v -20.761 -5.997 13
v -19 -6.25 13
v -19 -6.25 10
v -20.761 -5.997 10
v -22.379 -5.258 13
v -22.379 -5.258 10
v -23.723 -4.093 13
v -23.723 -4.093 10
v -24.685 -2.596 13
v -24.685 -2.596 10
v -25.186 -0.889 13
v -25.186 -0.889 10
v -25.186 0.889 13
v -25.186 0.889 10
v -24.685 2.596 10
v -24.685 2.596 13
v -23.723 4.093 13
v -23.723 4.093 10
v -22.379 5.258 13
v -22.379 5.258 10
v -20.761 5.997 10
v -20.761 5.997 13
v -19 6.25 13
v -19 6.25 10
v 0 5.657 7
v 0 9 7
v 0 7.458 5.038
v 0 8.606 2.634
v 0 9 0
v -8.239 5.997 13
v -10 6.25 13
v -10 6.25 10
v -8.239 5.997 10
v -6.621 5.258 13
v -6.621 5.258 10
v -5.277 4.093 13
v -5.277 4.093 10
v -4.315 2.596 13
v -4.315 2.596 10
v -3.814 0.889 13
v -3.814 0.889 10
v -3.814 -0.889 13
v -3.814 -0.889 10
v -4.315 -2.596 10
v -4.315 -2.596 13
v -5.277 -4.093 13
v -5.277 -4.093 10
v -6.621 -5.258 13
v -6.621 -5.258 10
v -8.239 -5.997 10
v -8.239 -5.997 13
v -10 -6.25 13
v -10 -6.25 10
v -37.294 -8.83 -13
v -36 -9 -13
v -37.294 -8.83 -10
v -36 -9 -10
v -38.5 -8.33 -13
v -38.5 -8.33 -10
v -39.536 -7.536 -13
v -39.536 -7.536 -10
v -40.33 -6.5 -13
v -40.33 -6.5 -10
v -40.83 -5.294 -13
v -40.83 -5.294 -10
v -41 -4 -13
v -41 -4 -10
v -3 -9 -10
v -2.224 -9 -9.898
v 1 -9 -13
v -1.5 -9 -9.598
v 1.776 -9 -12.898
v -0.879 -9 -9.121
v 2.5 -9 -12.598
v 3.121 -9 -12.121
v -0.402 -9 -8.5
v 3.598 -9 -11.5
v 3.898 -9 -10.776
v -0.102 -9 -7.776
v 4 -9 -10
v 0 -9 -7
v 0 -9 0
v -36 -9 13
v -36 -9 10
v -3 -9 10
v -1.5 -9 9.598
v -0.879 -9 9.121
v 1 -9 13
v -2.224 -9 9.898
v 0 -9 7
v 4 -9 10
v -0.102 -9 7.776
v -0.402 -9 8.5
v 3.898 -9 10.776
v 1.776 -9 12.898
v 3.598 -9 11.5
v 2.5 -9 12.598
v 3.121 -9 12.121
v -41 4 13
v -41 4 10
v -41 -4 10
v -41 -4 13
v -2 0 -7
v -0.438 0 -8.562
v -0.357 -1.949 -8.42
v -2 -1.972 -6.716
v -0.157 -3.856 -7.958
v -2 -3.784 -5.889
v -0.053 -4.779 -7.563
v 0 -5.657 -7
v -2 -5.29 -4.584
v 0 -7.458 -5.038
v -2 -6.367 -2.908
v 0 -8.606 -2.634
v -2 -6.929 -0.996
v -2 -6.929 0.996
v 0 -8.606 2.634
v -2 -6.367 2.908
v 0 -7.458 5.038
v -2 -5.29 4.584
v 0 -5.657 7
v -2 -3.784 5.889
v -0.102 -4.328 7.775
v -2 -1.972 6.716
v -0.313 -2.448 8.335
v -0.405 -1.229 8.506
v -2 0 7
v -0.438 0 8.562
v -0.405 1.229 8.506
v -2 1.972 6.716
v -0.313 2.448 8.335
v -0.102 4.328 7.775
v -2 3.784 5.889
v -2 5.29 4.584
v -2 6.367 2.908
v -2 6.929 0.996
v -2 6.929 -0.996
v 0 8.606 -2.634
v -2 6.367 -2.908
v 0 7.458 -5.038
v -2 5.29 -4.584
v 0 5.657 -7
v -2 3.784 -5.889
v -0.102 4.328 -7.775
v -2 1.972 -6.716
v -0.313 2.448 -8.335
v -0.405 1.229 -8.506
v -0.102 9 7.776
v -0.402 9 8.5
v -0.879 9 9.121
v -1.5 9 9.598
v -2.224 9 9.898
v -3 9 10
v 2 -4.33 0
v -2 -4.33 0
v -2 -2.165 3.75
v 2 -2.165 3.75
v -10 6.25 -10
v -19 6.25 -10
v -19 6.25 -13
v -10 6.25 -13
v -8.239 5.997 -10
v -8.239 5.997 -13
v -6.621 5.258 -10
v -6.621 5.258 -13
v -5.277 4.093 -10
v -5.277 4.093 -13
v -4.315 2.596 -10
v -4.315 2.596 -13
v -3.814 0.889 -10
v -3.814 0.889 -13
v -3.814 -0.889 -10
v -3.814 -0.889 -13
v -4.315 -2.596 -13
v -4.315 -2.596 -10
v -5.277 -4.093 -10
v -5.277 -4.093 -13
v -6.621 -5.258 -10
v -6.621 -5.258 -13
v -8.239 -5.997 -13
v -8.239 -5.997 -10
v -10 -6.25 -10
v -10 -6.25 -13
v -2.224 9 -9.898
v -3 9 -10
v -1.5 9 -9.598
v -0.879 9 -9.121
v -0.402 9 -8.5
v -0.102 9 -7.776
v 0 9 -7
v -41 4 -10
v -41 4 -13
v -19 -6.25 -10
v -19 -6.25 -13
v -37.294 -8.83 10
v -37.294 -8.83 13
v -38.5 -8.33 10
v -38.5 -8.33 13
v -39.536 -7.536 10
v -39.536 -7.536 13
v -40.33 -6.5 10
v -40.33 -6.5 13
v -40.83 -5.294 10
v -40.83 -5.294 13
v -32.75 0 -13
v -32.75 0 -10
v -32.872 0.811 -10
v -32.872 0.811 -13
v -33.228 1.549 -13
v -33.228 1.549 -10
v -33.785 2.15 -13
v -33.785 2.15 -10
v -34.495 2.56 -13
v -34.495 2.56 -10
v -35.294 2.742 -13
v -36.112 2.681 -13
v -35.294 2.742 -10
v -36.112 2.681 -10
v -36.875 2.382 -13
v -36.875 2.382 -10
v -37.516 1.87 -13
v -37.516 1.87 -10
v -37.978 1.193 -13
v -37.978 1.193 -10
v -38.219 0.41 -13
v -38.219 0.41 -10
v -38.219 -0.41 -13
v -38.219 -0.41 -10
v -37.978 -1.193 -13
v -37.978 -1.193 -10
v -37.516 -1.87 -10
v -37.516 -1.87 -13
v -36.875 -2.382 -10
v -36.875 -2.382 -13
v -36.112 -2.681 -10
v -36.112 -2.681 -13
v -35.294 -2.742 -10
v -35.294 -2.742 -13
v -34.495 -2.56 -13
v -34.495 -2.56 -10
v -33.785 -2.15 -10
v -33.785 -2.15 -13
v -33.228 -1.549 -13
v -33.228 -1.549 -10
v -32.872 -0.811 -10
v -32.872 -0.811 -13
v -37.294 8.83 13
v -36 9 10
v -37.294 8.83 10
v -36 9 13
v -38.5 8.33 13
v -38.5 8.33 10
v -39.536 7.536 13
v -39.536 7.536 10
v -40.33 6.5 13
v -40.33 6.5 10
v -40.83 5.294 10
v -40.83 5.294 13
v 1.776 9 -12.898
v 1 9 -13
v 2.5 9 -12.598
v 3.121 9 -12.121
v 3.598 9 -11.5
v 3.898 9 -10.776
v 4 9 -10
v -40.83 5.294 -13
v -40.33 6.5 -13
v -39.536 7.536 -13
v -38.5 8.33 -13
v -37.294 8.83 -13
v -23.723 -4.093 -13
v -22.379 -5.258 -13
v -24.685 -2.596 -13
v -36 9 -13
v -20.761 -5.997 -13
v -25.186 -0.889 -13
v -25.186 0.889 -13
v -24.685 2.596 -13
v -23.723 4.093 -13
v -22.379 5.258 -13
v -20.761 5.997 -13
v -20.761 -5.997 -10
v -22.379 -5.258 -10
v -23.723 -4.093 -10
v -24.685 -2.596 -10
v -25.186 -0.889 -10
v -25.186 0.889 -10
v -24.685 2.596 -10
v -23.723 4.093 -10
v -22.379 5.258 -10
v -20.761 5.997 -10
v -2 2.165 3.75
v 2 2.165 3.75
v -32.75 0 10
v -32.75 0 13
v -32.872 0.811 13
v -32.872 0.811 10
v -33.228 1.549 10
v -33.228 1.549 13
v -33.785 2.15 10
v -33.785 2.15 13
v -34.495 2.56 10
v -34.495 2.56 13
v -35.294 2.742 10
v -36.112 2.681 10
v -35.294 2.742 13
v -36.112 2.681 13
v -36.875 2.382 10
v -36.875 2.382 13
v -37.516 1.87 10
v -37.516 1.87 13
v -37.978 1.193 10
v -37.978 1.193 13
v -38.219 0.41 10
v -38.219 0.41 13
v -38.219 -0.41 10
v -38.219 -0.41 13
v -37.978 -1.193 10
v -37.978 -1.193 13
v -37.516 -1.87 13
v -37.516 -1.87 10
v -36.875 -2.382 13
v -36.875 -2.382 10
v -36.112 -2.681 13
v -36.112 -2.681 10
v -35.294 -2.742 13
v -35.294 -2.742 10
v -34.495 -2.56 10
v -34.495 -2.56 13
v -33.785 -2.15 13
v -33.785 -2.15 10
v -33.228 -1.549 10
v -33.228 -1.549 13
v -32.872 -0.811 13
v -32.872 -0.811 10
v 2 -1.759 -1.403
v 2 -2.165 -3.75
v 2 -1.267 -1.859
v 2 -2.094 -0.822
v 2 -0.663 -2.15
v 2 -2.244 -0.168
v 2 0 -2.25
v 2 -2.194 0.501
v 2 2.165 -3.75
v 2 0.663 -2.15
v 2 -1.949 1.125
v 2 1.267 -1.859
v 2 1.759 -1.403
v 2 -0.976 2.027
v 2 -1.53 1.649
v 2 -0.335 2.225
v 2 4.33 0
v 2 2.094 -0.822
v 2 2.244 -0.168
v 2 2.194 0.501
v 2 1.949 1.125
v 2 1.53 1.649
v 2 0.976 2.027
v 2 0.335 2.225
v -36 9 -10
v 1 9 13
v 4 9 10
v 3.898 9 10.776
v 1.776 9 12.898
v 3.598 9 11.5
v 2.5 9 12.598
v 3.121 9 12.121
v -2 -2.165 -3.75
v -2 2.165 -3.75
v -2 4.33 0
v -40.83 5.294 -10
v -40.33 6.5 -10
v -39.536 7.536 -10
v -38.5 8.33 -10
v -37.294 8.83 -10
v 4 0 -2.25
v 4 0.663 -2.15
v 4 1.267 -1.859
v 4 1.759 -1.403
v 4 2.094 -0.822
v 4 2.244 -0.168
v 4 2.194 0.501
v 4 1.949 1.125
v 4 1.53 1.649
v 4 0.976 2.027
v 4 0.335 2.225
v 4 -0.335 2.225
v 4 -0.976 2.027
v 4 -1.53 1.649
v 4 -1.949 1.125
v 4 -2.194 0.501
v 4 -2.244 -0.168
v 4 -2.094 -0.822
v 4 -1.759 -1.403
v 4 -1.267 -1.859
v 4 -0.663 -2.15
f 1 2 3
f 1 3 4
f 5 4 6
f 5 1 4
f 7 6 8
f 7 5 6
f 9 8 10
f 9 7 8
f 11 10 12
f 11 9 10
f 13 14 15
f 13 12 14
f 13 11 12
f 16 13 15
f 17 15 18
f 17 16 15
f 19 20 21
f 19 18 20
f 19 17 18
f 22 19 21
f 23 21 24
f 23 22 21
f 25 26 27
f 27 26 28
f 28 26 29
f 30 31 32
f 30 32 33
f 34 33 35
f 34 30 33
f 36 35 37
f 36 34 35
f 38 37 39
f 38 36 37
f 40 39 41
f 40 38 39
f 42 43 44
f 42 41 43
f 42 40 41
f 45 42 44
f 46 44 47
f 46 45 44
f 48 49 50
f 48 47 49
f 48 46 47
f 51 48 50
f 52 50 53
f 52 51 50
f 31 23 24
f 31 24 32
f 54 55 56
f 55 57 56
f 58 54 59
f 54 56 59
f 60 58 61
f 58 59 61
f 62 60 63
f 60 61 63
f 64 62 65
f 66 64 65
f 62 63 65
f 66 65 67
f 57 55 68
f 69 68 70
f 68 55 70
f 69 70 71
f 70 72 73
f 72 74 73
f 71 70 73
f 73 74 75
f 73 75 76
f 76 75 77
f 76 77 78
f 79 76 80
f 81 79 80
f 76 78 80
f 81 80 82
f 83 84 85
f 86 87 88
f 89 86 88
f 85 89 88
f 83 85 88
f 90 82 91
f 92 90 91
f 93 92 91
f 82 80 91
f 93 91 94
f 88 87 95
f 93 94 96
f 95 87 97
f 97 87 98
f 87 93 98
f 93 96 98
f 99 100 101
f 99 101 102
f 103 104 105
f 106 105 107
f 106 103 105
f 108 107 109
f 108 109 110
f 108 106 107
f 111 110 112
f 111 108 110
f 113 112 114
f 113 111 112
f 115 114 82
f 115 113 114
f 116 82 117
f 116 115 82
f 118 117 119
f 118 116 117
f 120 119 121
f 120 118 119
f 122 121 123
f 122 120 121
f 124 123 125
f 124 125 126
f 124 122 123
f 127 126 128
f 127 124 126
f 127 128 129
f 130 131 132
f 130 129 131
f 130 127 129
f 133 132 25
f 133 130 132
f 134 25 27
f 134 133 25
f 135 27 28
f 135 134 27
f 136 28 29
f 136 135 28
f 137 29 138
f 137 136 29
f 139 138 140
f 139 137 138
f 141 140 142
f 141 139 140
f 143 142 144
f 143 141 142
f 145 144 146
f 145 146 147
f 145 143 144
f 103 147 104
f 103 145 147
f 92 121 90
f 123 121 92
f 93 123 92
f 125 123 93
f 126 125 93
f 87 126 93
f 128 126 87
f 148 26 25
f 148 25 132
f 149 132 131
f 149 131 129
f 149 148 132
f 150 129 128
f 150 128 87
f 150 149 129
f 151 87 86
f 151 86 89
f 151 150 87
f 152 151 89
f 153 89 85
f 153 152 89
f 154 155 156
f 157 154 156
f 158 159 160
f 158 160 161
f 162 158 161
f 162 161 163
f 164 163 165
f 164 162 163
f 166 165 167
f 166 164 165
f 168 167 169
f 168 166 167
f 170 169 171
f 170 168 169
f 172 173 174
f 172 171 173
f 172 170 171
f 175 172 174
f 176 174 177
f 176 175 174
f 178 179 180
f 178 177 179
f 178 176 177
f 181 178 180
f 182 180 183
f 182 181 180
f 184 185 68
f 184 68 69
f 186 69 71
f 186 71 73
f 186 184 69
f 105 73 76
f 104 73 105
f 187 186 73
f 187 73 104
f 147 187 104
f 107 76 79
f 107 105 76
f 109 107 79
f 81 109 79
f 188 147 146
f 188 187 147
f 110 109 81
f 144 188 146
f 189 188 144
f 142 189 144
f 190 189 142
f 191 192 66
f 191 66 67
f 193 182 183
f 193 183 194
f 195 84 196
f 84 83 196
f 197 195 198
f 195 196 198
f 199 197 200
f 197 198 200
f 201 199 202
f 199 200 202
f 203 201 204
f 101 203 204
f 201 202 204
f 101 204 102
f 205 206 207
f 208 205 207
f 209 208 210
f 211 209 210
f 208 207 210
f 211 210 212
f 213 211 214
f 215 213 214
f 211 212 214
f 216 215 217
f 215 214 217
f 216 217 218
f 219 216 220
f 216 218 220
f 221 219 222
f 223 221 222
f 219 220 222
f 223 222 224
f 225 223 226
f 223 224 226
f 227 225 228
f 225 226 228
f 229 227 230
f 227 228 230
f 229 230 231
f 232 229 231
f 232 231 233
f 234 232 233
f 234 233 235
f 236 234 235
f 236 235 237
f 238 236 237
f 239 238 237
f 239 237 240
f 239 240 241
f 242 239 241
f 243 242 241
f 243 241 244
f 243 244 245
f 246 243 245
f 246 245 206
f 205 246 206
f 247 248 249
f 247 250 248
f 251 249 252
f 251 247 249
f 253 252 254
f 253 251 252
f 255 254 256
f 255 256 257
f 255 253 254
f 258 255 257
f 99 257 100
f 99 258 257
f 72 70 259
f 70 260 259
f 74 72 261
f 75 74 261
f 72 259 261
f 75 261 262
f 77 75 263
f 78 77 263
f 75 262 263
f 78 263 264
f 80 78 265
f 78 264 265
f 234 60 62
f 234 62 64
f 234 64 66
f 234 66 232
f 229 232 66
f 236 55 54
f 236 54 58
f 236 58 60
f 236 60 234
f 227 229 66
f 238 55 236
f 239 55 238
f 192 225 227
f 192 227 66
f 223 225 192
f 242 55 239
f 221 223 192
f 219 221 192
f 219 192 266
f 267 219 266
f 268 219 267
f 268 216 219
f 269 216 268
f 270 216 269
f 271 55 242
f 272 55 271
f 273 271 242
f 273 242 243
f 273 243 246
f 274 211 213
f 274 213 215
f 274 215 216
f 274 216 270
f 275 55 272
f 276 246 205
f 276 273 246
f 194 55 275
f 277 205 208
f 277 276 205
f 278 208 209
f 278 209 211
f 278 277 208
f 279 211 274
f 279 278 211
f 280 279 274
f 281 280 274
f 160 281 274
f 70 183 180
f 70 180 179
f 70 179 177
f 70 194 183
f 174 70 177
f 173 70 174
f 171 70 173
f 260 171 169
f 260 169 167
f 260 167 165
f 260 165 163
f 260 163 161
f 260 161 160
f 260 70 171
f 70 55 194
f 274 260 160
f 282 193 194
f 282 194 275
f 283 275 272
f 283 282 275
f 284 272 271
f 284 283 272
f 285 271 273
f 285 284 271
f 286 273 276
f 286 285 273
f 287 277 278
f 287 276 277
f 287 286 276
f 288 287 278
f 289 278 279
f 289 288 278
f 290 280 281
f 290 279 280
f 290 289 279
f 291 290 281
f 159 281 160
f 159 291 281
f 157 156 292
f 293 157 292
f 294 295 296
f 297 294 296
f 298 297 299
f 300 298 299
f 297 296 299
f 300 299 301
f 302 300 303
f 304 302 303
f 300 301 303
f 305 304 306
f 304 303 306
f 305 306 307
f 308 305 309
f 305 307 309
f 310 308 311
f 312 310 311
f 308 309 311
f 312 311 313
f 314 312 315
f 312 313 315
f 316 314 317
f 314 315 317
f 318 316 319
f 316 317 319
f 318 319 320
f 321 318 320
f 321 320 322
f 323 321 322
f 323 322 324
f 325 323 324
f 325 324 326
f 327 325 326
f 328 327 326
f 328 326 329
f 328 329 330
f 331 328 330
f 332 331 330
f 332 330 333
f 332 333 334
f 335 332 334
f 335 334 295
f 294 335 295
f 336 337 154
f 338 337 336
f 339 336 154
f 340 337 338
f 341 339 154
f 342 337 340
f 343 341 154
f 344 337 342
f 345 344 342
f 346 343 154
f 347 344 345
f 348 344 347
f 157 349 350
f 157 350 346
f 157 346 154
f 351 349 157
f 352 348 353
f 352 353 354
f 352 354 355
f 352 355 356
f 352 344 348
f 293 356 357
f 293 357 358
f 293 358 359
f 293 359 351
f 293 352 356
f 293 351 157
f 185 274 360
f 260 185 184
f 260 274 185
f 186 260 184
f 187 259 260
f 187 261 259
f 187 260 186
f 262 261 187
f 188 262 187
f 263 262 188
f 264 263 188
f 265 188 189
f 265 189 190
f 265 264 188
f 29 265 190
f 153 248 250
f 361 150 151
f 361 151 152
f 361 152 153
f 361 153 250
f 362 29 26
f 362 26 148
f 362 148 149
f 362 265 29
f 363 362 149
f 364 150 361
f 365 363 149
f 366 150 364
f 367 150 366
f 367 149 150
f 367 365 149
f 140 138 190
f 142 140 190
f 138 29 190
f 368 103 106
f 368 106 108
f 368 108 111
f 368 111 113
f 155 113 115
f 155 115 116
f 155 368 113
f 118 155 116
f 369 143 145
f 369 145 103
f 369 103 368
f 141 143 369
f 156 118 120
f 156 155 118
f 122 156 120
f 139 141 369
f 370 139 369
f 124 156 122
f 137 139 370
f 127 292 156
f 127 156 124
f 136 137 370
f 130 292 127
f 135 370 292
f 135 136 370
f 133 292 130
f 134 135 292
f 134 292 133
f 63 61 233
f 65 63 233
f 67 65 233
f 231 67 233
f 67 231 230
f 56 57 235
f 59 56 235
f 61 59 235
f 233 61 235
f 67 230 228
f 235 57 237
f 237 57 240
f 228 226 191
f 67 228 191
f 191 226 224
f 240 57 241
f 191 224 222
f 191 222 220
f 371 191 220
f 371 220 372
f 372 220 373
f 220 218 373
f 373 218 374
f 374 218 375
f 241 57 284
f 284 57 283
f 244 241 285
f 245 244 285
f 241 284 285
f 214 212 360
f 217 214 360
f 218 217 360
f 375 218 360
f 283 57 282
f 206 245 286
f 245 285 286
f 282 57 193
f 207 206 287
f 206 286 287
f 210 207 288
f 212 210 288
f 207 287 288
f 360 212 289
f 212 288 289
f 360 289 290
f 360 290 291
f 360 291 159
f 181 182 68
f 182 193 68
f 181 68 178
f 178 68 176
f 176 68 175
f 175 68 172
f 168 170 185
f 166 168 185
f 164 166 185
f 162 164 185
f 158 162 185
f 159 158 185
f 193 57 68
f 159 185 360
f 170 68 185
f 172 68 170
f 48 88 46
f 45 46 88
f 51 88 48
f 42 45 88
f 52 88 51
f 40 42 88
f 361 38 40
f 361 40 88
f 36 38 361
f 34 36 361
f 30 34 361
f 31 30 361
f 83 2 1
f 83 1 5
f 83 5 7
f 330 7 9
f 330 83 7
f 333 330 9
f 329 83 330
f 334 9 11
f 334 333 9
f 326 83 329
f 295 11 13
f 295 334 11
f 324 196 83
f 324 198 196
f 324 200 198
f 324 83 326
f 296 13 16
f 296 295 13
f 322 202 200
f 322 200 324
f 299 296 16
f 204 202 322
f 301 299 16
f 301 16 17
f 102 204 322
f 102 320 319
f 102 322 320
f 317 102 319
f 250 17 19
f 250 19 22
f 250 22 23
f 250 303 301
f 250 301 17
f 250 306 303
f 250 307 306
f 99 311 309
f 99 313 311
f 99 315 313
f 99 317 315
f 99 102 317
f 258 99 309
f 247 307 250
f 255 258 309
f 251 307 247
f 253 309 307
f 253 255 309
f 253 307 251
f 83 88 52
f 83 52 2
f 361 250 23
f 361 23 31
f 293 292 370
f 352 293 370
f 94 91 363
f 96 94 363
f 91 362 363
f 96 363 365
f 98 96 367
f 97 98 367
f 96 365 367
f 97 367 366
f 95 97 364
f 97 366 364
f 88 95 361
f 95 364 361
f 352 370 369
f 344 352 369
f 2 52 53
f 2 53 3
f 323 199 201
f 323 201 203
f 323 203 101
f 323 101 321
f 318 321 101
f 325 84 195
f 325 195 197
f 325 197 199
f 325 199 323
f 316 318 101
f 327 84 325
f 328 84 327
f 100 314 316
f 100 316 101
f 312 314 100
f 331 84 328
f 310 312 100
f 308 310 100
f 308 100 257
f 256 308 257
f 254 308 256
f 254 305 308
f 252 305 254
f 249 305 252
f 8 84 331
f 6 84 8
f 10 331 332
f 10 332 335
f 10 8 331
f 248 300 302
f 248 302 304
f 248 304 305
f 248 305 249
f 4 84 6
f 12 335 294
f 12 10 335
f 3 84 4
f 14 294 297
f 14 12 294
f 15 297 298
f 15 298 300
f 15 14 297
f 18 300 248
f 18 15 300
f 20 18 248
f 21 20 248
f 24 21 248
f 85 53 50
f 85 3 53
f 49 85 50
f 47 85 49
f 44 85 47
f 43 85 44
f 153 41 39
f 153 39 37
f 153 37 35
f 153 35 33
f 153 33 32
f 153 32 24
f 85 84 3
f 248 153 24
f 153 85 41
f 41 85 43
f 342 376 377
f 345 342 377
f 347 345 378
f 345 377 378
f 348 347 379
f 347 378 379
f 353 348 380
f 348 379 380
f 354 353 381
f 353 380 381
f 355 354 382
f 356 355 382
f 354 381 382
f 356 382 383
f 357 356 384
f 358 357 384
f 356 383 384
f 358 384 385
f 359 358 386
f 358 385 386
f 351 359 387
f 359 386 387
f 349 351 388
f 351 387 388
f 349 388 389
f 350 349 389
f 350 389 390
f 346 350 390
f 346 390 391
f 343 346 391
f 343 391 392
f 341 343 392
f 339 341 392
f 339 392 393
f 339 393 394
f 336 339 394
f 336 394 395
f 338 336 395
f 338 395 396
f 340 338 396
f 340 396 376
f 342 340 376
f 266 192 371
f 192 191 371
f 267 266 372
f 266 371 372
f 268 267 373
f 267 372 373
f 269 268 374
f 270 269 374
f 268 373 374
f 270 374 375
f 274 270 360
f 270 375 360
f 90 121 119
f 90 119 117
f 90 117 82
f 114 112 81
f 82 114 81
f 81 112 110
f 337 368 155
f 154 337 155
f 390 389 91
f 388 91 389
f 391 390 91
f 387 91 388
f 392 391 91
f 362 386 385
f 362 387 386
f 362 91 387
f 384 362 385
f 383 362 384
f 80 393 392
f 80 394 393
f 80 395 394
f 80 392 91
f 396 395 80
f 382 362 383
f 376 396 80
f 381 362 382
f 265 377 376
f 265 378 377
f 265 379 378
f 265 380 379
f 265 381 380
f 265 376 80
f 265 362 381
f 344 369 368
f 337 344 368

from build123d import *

# Parameters (mm, degrees)
SKETCH1_W           = 26
SKETCH1_H           = 18
BOSS_EXTRUDE1_DEPTH = 4
SKETCH2_W           = 3
SKETCH2_H           = 18
BOSS_EXTRUDE2_DEPTH = 41
SKETCH3_R           = 2.75
CUT_EXTRUDE1_DEPTH  = 50.376107583
FILLET1_R           = 3
FILLET2_R           = 5
SKETCH5_R           = 7
BOSS_EXTRUDE3_DEPTH = 2
CUT_EXTRUDE3_REACH  = 49.697
SKETCH7_R           = 2.25
CUT_EXTRUDE4_DEPTH  = 4
CHAMFER1_SIZE       = 2
CUT_EXTRUDE5_DEPTH  = 50.376107601


with BuildPart() as part:
    # Sketch1 → Boss-Extrude1 (new body)
    with BuildSketch(Plane(origin=(0, 0, 0), x_dir=(0, 0, -1), z_dir=(1, 0, 0))):
        Rectangle(SKETCH1_W, SKETCH1_H)
    extrude(amount=BOSS_EXTRUDE1_DEPTH)

    # Sketch2 → Boss-Extrude2 (add)
    with BuildSketch(Plane.ZY):
        with Locations((-11.5, 0)):
            Rectangle(SKETCH2_W, SKETCH2_H)
        with Locations((11.5, 0)):
            Rectangle(SKETCH2_W, SKETCH2_H)
    extrude(amount=BOSS_EXTRUDE2_DEPTH)

    # Sketch3 → Cut-Extrude1 (cut, through all)
    with BuildSketch(Plane.XY.offset(13)):
        with Locations((-35.5, 0)):
            Circle(SKETCH3_R)
    extrude(amount=-CUT_EXTRUDE1_DEPTH, mode=Mode.SUBTRACT)

    # Fillet1
    fillet1_edges = [part.edges().sort_by_distance(p)[0] for p in [
        (4, 0, 13),
        (0, 0, -10),
        (0, 0, 10),
        (4, 0, -13),
    ]]
    fillet(fillet1_edges, radius=FILLET1_R)

    # Fillet2
    fillet2_edges = [part.edges().sort_by_distance(p)[0] for p in [
        (-41, -9, -11.5),
        (-41, 9, -11.5),
        (-41, 9, 11.5),
        (-41, -9, 11.5),
    ]]
    fillet(fillet2_edges, radius=FILLET2_R)

    # Sketch5 → Boss-Extrude3 (add)
    with BuildSketch(Plane.ZY):
        Circle(SKETCH5_R)
    extrude(amount=BOSS_EXTRUDE3_DEPTH)

    # Sketch7 → Cut-Extrude3 (cut, up to next)
    with BuildSketch(Plane(origin=(4, 0, 0), x_dir=(0, 0, -1), z_dir=(1, 0, 0)), mode=Mode.PRIVATE) as cut_extrude3_sk1:
        Circle(SKETCH7_R)
    cut_extrude3_tool1 = extrude(cut_extrude3_sk1.sketch, amount=-CUT_EXTRUDE3_REACH, mode=Mode.PRIVATE) & part.part
    add(cut_extrude3_tool1.solids().sort_by_distance((4, 0, 0))[0], mode=Mode.SUBTRACT)

    # Sketch8 → Cut-Extrude4 (cut)
    with BuildSketch(Plane.ZY.offset(2)):
        Polygon((0, 4.330127019), (-3.75, 2.165063509), (-3.75, -2.165063509), (0, -4.330127019), (3.75, -2.165063509), (3.75, 2.165063509), align=None)
    extrude(amount=-CUT_EXTRUDE4_DEPTH, mode=Mode.SUBTRACT)

    # Chamfer1
    # the kernel refuses this chamfer: 2 mm, written as the material it adds along each edge
    with BuildSketch(Plane(origin=(0, 0, 0), x_dir=(0, 0, 1), z_dir=(0, -1, 0))) as chamfer1_piece_1_section:
        Polygon((7 + CHAMFER1_SIZE, 0), (7, CHAMFER1_SIZE), (7, 0), align=None)
    chamfer1_piece_1 = revolve(axis=Axis((0, 0, 0), (-1, 0, 0)), revolution_arc=180.000000041, mode=Mode.PRIVATE)
    chamfer1_piece_1 = split(chamfer1_piece_1, bisect_by=Plane(origin=(-0.945175713, 9, -3e-09), z_dir=(0, -1, 0)), keep=Keep.TOP, mode=Mode.PRIVATE)
    chamfer1_piece_1 = split(chamfer1_piece_1, bisect_by=Plane(origin=(-2, 8.001744255, -3e-09), z_dir=(1, 0, 0)), keep=Keep.TOP, mode=Mode.PRIVATE)
    add(chamfer1_piece_1)
    with BuildSketch(Plane(origin=(0, 0, 0), x_dir=(0, -7.23525117256177e-10, -1.0), z_dir=(0, 1.0, -7.23525117256177e-10))) as chamfer1_piece_2_section:
        Polygon((7 + CHAMFER1_SIZE, 0), (7, CHAMFER1_SIZE), (7, 0), align=None)
    chamfer1_piece_2 = revolve(axis=Axis((0, 0, 0), (-1, 0, 0)), revolution_arc=179.999999959, mode=Mode.PRIVATE)
    chamfer1_piece_2 = split(chamfer1_piece_2, bisect_by=Plane(origin=(-0.945175715, -9, 3e-09), z_dir=(0, 1, 0)), keep=Keep.TOP, mode=Mode.PRIVATE)
    chamfer1_piece_2 = split(chamfer1_piece_2, bisect_by=Plane(origin=(-2, -8.001744258, 3e-09), z_dir=(1, 0, 0)), keep=Keep.TOP, mode=Mode.PRIVATE)
    add(chamfer1_piece_2)

    # Sketch9 → Cut-Extrude5 (cut, through all)
    with BuildSketch(Plane.XY.offset(13)):
        with BuildLine():
            Line((-19, 6.25), (-10, 6.25))
            ThreePointArc((-10, 6.25), (-3.75, 0), (-10, -6.25))
            Line((-10, -6.25), (-19, -6.25))
            ThreePointArc((-19, -6.25), (-25.25, 0), (-19, 6.25))
        make_face()
    extrude(amount=-CUT_EXTRUDE5_DEPTH, mode=Mode.SUBTRACT)


solid = part.part
